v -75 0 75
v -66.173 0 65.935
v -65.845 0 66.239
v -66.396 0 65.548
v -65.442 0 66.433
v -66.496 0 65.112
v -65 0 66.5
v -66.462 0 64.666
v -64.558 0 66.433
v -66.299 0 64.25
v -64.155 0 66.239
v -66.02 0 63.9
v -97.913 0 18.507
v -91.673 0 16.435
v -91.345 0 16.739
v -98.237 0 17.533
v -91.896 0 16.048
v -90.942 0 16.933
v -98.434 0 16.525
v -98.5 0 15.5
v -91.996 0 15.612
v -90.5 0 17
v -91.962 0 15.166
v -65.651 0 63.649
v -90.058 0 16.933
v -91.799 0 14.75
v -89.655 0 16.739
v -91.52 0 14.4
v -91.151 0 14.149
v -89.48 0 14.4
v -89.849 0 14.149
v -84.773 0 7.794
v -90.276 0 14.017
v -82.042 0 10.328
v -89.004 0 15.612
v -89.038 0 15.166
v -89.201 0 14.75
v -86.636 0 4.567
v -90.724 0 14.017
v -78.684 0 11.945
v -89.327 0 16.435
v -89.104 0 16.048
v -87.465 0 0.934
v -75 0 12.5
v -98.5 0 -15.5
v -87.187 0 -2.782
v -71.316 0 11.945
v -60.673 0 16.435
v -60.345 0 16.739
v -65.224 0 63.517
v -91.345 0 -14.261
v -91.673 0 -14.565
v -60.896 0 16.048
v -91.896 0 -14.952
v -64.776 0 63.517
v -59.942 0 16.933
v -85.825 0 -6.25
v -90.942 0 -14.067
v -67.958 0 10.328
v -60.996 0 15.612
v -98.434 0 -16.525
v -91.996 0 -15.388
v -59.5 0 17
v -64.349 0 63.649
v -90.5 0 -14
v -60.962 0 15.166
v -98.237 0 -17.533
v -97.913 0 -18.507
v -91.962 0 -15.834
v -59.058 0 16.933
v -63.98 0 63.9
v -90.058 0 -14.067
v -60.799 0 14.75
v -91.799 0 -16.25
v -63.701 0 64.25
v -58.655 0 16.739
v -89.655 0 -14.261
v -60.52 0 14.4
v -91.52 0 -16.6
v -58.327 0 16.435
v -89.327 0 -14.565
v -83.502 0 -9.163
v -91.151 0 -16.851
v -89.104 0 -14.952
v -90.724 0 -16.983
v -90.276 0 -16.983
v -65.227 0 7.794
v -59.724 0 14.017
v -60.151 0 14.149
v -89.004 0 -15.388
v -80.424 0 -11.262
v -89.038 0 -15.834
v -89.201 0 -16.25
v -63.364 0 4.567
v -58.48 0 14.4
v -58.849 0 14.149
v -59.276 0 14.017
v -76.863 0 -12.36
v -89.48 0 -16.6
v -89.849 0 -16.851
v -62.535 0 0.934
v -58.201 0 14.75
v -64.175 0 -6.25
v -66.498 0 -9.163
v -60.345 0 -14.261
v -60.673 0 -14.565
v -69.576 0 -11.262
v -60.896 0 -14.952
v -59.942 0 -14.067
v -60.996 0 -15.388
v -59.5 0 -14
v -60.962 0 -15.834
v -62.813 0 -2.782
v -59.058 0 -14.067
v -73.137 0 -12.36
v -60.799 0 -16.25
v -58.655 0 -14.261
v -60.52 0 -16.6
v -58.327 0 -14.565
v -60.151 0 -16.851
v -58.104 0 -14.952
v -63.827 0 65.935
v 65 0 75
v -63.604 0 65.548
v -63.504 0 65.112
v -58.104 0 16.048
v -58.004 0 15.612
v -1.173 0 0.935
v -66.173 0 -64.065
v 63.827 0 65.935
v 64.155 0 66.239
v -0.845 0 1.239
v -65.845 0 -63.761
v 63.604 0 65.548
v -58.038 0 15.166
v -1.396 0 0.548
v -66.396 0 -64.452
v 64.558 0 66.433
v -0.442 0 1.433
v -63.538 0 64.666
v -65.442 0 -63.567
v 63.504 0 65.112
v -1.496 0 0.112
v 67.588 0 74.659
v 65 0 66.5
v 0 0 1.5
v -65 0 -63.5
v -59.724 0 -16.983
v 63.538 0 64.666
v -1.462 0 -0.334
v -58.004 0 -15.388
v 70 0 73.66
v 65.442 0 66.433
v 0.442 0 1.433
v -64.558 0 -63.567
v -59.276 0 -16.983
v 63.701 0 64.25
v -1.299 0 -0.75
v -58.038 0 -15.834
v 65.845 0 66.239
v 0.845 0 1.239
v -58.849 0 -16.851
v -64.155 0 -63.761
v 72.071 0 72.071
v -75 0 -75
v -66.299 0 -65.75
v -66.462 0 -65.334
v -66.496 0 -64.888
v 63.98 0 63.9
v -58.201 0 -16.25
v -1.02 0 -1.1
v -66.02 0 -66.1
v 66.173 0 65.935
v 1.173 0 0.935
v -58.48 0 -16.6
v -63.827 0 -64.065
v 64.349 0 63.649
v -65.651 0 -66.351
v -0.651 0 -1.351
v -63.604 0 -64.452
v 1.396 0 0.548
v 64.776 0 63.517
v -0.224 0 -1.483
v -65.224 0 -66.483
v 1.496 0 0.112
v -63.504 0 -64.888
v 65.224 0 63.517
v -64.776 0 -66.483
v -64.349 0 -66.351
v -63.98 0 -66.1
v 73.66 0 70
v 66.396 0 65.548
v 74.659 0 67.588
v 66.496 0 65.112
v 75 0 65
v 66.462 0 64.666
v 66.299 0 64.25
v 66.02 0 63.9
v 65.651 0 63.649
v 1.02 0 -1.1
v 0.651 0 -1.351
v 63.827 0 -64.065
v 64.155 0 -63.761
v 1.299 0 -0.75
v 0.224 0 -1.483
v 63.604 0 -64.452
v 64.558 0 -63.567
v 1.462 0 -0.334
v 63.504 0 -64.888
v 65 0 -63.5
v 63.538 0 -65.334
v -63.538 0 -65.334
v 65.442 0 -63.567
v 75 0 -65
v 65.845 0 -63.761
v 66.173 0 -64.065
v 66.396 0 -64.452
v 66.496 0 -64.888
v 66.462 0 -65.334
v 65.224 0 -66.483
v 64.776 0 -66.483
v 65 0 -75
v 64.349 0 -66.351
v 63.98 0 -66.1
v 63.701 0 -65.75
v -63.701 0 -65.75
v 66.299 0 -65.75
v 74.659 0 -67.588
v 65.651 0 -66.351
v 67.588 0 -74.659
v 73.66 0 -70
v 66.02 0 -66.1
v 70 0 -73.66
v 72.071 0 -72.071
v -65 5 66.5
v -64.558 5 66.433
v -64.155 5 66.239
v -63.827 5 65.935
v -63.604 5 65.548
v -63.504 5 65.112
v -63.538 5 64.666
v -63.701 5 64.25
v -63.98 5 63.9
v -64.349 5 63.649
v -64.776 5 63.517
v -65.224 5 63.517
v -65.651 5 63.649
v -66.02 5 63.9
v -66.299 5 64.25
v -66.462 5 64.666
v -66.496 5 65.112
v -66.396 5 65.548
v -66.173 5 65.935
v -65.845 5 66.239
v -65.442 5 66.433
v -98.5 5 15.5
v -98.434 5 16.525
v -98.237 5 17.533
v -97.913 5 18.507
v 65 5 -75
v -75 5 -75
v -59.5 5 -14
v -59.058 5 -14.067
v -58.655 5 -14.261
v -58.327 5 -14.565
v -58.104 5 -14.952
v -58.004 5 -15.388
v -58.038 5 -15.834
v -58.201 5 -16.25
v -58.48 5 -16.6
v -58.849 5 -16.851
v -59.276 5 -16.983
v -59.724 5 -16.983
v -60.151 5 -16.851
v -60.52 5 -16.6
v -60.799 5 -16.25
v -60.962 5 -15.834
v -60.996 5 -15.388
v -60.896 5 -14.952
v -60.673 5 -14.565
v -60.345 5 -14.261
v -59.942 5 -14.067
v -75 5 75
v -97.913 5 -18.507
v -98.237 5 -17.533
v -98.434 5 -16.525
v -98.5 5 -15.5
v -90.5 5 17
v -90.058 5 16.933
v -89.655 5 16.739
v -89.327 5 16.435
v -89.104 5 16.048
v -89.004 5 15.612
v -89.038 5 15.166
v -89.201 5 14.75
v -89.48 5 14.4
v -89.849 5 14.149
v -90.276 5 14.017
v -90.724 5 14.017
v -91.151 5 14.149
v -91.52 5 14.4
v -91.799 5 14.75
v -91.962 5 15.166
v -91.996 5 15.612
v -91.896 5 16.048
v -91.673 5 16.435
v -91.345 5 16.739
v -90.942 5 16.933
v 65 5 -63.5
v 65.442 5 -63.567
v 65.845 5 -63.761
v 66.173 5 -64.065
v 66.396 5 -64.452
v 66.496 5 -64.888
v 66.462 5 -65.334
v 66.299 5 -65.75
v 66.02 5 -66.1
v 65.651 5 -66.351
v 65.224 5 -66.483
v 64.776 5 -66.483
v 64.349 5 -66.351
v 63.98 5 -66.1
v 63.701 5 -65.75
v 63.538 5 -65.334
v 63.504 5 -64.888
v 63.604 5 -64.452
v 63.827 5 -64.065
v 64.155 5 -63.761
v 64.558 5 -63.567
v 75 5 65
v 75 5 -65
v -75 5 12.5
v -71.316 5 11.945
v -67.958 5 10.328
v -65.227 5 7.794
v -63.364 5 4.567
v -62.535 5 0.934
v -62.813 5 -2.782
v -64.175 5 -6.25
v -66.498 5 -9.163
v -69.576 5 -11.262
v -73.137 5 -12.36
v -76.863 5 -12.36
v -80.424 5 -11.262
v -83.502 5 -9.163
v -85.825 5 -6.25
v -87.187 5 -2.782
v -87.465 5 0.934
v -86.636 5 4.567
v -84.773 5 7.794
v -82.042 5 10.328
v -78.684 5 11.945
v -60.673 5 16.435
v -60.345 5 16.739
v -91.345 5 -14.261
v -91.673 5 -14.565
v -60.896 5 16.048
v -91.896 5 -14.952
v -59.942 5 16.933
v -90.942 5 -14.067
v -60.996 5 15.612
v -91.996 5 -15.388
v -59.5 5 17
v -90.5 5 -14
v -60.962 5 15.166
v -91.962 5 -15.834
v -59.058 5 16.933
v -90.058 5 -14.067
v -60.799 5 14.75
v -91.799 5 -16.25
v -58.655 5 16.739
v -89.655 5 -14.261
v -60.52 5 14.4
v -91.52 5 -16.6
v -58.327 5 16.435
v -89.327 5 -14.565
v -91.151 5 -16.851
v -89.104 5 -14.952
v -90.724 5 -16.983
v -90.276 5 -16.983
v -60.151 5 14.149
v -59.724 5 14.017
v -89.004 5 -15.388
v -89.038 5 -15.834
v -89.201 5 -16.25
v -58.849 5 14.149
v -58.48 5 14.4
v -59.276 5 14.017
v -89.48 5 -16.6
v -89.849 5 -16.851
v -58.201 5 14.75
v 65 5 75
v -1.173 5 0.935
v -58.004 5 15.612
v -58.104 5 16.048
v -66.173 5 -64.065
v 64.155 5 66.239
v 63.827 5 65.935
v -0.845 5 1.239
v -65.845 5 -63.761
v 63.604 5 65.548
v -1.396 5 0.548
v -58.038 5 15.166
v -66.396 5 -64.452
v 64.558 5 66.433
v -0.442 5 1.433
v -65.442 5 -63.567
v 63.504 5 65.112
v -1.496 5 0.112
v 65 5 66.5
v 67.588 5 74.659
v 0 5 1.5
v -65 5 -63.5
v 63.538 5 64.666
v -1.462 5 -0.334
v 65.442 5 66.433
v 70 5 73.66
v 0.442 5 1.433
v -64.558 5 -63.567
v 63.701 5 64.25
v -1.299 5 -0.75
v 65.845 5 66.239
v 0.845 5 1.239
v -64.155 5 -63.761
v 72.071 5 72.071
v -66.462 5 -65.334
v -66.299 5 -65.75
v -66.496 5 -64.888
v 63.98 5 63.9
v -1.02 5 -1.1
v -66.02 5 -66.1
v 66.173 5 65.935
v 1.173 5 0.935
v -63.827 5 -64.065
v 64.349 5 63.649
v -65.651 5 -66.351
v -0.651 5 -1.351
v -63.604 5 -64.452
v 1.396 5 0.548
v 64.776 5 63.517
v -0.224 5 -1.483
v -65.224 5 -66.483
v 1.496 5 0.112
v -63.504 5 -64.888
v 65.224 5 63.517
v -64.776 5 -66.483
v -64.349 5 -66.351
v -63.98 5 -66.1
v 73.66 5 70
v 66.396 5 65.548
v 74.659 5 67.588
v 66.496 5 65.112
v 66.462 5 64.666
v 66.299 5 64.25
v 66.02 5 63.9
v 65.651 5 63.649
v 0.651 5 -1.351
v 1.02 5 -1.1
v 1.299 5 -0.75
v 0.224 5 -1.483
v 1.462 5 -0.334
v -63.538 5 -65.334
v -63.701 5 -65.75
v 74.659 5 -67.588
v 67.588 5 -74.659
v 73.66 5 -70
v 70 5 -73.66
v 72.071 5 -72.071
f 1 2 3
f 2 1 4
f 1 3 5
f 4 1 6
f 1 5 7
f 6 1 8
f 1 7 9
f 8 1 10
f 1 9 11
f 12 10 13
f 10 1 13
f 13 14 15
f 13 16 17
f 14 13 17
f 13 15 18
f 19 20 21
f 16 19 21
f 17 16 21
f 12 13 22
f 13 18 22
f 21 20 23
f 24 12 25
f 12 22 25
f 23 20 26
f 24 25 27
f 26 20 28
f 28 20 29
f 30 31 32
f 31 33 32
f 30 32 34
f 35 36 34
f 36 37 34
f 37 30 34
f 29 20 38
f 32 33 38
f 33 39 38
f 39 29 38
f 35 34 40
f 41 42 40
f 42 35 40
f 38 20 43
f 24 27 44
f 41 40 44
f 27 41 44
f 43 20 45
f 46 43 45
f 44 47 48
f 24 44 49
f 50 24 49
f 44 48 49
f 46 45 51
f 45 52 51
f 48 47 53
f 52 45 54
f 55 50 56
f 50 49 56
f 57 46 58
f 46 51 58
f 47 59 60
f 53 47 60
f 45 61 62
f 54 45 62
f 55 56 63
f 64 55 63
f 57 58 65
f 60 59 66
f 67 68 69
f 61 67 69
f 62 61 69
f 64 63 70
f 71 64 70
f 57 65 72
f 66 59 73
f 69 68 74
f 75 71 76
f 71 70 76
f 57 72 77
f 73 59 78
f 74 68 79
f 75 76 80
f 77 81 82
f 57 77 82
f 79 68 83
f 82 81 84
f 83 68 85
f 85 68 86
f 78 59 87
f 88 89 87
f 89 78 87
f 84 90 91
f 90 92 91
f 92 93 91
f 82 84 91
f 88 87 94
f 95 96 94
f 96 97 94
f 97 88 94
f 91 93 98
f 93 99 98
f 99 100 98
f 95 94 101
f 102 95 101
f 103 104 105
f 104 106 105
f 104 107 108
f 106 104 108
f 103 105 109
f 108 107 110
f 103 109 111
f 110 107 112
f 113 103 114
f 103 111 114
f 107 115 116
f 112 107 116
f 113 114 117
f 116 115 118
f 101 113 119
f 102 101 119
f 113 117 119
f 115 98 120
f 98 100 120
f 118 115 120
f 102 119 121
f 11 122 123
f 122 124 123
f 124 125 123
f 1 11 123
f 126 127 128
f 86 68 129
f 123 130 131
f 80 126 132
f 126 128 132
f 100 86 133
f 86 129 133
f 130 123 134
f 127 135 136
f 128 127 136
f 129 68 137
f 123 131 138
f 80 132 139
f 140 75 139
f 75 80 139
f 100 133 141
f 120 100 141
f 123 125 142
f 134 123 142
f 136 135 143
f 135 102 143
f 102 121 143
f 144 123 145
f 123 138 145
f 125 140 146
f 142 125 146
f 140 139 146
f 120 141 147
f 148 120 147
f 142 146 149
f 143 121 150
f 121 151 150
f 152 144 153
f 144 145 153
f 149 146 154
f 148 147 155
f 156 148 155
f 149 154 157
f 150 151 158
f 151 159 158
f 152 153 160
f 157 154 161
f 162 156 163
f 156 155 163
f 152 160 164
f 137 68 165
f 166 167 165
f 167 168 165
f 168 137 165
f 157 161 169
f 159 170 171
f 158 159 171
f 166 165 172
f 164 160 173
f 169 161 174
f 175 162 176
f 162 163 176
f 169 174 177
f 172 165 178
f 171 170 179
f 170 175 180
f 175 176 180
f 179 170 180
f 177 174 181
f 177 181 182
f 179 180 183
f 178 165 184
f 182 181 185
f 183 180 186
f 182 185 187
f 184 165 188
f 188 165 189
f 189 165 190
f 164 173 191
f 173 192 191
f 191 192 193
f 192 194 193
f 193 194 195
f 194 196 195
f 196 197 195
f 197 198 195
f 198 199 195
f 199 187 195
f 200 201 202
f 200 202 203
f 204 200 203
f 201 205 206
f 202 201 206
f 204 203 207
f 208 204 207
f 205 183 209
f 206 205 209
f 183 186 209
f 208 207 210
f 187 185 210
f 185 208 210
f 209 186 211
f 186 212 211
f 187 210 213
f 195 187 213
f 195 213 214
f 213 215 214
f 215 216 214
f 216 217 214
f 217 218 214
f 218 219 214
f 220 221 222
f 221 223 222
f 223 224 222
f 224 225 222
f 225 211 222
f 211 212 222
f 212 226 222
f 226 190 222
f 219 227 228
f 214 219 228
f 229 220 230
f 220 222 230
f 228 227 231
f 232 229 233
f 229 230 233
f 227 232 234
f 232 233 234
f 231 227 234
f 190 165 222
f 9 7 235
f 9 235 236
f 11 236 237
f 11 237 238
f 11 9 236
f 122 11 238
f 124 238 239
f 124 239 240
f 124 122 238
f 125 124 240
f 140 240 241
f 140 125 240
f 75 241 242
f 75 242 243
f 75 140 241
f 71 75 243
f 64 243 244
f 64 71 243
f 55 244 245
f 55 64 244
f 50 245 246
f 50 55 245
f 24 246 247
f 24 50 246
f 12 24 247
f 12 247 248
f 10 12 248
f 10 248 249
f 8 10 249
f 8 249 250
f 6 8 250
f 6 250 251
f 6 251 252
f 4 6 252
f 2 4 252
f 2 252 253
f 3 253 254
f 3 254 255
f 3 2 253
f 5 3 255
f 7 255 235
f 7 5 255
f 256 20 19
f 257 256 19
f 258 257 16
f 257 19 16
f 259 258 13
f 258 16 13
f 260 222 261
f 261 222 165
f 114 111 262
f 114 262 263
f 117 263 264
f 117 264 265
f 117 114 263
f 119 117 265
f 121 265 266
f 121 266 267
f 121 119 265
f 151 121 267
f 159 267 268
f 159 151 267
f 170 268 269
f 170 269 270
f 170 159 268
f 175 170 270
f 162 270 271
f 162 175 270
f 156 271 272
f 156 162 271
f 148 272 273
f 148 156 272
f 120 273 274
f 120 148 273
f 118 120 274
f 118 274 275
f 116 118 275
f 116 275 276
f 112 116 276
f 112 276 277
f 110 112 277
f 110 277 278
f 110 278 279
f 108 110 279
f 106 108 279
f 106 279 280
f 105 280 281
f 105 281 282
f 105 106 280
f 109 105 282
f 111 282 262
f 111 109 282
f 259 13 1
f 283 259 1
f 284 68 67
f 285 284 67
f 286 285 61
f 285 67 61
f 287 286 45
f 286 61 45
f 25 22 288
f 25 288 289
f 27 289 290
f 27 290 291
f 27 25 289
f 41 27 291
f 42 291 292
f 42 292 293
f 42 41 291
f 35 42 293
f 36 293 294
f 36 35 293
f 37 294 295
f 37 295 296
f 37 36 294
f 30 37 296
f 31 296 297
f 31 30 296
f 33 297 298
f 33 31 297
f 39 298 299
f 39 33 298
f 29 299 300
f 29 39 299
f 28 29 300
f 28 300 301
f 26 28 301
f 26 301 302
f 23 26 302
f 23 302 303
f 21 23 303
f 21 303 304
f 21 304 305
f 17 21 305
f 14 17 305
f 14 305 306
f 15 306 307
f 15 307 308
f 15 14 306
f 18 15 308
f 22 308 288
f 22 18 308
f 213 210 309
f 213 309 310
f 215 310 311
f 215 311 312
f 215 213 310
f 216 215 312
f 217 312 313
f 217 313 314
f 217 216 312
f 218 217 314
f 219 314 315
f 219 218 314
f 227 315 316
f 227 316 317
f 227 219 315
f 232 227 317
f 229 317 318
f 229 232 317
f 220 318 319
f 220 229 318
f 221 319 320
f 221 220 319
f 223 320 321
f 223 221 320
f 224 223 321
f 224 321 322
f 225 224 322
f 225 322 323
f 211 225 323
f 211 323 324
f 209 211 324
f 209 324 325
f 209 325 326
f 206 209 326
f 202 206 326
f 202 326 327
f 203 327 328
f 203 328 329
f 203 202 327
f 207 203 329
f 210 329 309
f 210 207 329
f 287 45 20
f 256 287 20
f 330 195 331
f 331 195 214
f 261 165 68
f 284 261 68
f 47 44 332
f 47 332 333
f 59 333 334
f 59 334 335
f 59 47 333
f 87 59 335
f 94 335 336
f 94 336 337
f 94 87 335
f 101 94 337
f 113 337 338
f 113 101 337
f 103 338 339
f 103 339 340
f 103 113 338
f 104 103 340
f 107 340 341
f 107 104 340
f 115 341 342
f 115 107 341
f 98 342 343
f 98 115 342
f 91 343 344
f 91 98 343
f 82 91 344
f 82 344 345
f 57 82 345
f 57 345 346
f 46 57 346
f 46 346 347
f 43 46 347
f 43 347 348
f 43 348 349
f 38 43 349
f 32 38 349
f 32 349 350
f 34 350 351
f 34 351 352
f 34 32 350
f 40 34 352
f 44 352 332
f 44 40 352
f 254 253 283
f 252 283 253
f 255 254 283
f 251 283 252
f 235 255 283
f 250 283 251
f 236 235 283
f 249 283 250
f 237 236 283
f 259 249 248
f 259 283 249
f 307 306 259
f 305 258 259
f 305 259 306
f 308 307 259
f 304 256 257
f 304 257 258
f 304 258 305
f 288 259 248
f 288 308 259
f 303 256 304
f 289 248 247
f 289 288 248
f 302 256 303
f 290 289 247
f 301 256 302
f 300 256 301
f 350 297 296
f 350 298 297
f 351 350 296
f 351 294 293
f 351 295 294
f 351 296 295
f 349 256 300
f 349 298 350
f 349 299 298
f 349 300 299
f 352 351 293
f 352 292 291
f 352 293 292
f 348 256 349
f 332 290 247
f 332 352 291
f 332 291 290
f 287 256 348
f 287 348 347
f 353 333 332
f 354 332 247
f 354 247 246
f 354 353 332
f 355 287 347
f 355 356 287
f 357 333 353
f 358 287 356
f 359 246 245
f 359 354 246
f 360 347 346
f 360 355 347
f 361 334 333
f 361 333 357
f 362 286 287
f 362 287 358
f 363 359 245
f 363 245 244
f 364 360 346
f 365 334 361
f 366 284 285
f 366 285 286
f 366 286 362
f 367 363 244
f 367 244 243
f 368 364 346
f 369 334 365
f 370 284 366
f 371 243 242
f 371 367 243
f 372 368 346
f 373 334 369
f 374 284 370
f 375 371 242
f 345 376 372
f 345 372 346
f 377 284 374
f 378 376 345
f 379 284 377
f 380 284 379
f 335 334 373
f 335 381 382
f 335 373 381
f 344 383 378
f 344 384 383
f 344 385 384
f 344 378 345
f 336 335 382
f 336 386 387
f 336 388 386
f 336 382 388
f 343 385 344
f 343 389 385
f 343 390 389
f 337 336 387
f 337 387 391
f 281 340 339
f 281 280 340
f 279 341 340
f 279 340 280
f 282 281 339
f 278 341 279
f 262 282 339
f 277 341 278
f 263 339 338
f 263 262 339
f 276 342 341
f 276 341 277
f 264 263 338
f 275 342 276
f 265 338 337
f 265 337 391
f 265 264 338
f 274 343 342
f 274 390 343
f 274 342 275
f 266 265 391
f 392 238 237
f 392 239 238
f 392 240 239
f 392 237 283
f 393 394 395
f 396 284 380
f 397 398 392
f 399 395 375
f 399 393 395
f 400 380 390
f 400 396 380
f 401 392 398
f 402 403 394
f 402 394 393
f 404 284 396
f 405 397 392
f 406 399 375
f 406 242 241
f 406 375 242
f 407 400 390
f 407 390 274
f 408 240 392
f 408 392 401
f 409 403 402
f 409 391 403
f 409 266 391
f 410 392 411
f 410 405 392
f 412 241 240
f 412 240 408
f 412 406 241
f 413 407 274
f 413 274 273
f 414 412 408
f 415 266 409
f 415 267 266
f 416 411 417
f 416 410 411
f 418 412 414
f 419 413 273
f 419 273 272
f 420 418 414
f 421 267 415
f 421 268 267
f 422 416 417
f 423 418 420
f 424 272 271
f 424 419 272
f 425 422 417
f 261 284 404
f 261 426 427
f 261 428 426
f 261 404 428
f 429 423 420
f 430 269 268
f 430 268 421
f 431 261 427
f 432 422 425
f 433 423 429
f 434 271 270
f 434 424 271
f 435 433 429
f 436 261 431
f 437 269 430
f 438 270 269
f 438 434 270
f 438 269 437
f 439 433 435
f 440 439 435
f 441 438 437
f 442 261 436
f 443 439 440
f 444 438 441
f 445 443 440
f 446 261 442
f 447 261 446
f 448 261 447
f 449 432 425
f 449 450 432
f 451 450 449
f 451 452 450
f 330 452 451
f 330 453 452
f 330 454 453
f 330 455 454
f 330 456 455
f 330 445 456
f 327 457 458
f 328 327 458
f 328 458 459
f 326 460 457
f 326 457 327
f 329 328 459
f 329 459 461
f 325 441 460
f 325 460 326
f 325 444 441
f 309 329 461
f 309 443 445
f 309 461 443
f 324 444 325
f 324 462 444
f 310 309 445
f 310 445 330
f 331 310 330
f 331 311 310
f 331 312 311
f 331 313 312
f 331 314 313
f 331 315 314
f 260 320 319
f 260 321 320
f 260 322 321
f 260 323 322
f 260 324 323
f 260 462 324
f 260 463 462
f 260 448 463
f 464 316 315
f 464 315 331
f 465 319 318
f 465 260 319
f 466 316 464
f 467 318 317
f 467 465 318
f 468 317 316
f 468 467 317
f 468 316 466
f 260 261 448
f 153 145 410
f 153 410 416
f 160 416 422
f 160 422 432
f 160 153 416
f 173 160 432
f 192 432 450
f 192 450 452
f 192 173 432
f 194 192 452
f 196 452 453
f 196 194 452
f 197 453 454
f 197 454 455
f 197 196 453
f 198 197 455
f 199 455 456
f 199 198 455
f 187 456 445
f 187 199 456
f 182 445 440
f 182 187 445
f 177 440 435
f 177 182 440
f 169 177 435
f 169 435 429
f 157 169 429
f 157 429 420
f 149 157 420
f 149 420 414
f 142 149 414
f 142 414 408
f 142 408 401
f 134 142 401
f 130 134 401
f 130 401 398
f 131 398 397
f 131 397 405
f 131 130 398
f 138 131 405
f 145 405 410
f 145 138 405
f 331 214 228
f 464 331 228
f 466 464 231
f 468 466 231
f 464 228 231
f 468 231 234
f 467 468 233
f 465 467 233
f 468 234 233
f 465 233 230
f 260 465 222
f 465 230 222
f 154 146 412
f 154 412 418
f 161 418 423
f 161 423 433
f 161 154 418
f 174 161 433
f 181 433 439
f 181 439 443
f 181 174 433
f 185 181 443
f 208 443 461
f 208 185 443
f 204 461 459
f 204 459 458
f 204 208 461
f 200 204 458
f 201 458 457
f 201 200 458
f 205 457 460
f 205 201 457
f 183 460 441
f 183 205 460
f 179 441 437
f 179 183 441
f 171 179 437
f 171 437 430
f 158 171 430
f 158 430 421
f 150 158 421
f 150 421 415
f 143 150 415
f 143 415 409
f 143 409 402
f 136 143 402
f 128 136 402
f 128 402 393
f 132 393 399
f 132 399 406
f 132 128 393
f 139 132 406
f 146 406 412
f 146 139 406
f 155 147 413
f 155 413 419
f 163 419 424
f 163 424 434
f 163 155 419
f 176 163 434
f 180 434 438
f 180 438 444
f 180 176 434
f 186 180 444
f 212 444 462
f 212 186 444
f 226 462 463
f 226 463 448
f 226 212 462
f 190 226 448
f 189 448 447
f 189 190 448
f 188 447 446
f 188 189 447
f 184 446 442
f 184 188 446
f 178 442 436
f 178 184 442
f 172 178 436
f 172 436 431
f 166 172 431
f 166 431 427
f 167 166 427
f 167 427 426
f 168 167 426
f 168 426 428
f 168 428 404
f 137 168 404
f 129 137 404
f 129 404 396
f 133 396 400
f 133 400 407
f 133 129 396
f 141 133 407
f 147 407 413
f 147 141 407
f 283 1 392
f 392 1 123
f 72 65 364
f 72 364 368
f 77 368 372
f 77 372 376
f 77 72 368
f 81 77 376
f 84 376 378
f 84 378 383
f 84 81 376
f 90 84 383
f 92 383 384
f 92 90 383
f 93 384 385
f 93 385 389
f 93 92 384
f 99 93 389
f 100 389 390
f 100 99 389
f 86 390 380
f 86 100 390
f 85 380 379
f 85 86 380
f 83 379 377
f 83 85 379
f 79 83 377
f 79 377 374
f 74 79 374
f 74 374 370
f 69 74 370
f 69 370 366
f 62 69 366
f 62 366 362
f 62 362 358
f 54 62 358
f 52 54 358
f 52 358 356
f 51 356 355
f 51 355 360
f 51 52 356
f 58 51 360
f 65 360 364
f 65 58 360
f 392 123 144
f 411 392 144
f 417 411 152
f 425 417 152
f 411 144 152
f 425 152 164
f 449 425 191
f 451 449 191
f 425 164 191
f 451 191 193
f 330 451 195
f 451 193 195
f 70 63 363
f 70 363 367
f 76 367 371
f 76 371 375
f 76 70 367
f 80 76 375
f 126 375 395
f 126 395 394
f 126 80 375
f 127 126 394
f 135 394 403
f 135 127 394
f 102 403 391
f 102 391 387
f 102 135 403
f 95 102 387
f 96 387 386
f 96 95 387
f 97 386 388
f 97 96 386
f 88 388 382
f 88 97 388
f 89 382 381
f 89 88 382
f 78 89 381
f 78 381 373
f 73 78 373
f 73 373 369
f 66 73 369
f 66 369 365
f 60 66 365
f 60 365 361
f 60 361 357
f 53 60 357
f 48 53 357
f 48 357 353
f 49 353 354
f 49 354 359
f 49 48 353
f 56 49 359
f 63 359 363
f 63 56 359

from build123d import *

# Parameters (mm, degrees)
SKETCH1_R           = 1.5
SKETCH1_R_2         = 12.5
BOSS_EXTRUDE1_DEPTH = 5


with BuildPart() as part:
    # Sketch1 → Boss-Extrude1 (new body)
    with BuildSketch(Plane(origin=(0, 0, 0), x_dir=(1, 0, 0), z_dir=(0, 1, 0))):
        with BuildLine():
            Line((-75, -75), (65, -75))
            ThreePointArc((65, -75), (72.071067812, -72.071067812), (75, -65))
            Line((75, -65), (75, 65))
            ThreePointArc((75, 65), (72.071067812, 72.071067812), (65, 75))
            Line((65, 75), (-75, 75))
            Line((-75, 75), (-97.913420794, 18.506857518))
            ThreePointArc((-97.913420794, 18.506857518), (-98.351985938, 17.031769181), (-98.5, 15.5))
            Line((-98.5, 15.5), (-98.5, -15.5))
            ThreePointArc((-98.5, -15.5), (-98.351985938, -17.031769181), (-97.913420794, -18.506857518))
            Line((-97.913420794, -18.506857518), (-75, -75))
        make_face()
        with Locations(Location((-90.5, 15.5, 0), (0, 0, 270))):
            Circle(SKETCH1_R, mode=Mode.SUBTRACT)
        with Locations(Location((-90.5, -15.5, 0), (0, 0, 270))):
            Circle(SKETCH1_R, mode=Mode.SUBTRACT)
        with Locations(Location((-59.5, -15.5, 0), (0, 0, 270))):
            Circle(SKETCH1_R, mode=Mode.SUBTRACT)
        with Locations(Location((-59.5, 15.5, 0), (0, 0, 270))):
            Circle(SKETCH1_R, mode=Mode.SUBTRACT)
        with Locations(Location((-75, 0, 0), (0, 0, 270))):
            Circle(SKETCH1_R_2, mode=Mode.SUBTRACT)
        with Locations(Location((-65, 65, 0), (0, 0, 270))):
            Circle(SKETCH1_R, mode=Mode.SUBTRACT)
        with Locations(Location((65, 65, 0), (0, 0, 270))):
            Circle(SKETCH1_R, mode=Mode.SUBTRACT)
        with Locations(Location((65, -65, 0), (0, 0, 270))):
            Circle(SKETCH1_R, mode=Mode.SUBTRACT)
        with Locations(Location((-65, -65, 0), (0, 0, 270))):
            Circle(SKETCH1_R, mode=Mode.SUBTRACT)
        with Locations(Location((0, 0, 0), (0, 0, 270))):
            Circle(SKETCH1_R, mode=Mode.SUBTRACT)
    extrude(amount=BOSS_EXTRUDE1_DEPTH)


solid = part.part
